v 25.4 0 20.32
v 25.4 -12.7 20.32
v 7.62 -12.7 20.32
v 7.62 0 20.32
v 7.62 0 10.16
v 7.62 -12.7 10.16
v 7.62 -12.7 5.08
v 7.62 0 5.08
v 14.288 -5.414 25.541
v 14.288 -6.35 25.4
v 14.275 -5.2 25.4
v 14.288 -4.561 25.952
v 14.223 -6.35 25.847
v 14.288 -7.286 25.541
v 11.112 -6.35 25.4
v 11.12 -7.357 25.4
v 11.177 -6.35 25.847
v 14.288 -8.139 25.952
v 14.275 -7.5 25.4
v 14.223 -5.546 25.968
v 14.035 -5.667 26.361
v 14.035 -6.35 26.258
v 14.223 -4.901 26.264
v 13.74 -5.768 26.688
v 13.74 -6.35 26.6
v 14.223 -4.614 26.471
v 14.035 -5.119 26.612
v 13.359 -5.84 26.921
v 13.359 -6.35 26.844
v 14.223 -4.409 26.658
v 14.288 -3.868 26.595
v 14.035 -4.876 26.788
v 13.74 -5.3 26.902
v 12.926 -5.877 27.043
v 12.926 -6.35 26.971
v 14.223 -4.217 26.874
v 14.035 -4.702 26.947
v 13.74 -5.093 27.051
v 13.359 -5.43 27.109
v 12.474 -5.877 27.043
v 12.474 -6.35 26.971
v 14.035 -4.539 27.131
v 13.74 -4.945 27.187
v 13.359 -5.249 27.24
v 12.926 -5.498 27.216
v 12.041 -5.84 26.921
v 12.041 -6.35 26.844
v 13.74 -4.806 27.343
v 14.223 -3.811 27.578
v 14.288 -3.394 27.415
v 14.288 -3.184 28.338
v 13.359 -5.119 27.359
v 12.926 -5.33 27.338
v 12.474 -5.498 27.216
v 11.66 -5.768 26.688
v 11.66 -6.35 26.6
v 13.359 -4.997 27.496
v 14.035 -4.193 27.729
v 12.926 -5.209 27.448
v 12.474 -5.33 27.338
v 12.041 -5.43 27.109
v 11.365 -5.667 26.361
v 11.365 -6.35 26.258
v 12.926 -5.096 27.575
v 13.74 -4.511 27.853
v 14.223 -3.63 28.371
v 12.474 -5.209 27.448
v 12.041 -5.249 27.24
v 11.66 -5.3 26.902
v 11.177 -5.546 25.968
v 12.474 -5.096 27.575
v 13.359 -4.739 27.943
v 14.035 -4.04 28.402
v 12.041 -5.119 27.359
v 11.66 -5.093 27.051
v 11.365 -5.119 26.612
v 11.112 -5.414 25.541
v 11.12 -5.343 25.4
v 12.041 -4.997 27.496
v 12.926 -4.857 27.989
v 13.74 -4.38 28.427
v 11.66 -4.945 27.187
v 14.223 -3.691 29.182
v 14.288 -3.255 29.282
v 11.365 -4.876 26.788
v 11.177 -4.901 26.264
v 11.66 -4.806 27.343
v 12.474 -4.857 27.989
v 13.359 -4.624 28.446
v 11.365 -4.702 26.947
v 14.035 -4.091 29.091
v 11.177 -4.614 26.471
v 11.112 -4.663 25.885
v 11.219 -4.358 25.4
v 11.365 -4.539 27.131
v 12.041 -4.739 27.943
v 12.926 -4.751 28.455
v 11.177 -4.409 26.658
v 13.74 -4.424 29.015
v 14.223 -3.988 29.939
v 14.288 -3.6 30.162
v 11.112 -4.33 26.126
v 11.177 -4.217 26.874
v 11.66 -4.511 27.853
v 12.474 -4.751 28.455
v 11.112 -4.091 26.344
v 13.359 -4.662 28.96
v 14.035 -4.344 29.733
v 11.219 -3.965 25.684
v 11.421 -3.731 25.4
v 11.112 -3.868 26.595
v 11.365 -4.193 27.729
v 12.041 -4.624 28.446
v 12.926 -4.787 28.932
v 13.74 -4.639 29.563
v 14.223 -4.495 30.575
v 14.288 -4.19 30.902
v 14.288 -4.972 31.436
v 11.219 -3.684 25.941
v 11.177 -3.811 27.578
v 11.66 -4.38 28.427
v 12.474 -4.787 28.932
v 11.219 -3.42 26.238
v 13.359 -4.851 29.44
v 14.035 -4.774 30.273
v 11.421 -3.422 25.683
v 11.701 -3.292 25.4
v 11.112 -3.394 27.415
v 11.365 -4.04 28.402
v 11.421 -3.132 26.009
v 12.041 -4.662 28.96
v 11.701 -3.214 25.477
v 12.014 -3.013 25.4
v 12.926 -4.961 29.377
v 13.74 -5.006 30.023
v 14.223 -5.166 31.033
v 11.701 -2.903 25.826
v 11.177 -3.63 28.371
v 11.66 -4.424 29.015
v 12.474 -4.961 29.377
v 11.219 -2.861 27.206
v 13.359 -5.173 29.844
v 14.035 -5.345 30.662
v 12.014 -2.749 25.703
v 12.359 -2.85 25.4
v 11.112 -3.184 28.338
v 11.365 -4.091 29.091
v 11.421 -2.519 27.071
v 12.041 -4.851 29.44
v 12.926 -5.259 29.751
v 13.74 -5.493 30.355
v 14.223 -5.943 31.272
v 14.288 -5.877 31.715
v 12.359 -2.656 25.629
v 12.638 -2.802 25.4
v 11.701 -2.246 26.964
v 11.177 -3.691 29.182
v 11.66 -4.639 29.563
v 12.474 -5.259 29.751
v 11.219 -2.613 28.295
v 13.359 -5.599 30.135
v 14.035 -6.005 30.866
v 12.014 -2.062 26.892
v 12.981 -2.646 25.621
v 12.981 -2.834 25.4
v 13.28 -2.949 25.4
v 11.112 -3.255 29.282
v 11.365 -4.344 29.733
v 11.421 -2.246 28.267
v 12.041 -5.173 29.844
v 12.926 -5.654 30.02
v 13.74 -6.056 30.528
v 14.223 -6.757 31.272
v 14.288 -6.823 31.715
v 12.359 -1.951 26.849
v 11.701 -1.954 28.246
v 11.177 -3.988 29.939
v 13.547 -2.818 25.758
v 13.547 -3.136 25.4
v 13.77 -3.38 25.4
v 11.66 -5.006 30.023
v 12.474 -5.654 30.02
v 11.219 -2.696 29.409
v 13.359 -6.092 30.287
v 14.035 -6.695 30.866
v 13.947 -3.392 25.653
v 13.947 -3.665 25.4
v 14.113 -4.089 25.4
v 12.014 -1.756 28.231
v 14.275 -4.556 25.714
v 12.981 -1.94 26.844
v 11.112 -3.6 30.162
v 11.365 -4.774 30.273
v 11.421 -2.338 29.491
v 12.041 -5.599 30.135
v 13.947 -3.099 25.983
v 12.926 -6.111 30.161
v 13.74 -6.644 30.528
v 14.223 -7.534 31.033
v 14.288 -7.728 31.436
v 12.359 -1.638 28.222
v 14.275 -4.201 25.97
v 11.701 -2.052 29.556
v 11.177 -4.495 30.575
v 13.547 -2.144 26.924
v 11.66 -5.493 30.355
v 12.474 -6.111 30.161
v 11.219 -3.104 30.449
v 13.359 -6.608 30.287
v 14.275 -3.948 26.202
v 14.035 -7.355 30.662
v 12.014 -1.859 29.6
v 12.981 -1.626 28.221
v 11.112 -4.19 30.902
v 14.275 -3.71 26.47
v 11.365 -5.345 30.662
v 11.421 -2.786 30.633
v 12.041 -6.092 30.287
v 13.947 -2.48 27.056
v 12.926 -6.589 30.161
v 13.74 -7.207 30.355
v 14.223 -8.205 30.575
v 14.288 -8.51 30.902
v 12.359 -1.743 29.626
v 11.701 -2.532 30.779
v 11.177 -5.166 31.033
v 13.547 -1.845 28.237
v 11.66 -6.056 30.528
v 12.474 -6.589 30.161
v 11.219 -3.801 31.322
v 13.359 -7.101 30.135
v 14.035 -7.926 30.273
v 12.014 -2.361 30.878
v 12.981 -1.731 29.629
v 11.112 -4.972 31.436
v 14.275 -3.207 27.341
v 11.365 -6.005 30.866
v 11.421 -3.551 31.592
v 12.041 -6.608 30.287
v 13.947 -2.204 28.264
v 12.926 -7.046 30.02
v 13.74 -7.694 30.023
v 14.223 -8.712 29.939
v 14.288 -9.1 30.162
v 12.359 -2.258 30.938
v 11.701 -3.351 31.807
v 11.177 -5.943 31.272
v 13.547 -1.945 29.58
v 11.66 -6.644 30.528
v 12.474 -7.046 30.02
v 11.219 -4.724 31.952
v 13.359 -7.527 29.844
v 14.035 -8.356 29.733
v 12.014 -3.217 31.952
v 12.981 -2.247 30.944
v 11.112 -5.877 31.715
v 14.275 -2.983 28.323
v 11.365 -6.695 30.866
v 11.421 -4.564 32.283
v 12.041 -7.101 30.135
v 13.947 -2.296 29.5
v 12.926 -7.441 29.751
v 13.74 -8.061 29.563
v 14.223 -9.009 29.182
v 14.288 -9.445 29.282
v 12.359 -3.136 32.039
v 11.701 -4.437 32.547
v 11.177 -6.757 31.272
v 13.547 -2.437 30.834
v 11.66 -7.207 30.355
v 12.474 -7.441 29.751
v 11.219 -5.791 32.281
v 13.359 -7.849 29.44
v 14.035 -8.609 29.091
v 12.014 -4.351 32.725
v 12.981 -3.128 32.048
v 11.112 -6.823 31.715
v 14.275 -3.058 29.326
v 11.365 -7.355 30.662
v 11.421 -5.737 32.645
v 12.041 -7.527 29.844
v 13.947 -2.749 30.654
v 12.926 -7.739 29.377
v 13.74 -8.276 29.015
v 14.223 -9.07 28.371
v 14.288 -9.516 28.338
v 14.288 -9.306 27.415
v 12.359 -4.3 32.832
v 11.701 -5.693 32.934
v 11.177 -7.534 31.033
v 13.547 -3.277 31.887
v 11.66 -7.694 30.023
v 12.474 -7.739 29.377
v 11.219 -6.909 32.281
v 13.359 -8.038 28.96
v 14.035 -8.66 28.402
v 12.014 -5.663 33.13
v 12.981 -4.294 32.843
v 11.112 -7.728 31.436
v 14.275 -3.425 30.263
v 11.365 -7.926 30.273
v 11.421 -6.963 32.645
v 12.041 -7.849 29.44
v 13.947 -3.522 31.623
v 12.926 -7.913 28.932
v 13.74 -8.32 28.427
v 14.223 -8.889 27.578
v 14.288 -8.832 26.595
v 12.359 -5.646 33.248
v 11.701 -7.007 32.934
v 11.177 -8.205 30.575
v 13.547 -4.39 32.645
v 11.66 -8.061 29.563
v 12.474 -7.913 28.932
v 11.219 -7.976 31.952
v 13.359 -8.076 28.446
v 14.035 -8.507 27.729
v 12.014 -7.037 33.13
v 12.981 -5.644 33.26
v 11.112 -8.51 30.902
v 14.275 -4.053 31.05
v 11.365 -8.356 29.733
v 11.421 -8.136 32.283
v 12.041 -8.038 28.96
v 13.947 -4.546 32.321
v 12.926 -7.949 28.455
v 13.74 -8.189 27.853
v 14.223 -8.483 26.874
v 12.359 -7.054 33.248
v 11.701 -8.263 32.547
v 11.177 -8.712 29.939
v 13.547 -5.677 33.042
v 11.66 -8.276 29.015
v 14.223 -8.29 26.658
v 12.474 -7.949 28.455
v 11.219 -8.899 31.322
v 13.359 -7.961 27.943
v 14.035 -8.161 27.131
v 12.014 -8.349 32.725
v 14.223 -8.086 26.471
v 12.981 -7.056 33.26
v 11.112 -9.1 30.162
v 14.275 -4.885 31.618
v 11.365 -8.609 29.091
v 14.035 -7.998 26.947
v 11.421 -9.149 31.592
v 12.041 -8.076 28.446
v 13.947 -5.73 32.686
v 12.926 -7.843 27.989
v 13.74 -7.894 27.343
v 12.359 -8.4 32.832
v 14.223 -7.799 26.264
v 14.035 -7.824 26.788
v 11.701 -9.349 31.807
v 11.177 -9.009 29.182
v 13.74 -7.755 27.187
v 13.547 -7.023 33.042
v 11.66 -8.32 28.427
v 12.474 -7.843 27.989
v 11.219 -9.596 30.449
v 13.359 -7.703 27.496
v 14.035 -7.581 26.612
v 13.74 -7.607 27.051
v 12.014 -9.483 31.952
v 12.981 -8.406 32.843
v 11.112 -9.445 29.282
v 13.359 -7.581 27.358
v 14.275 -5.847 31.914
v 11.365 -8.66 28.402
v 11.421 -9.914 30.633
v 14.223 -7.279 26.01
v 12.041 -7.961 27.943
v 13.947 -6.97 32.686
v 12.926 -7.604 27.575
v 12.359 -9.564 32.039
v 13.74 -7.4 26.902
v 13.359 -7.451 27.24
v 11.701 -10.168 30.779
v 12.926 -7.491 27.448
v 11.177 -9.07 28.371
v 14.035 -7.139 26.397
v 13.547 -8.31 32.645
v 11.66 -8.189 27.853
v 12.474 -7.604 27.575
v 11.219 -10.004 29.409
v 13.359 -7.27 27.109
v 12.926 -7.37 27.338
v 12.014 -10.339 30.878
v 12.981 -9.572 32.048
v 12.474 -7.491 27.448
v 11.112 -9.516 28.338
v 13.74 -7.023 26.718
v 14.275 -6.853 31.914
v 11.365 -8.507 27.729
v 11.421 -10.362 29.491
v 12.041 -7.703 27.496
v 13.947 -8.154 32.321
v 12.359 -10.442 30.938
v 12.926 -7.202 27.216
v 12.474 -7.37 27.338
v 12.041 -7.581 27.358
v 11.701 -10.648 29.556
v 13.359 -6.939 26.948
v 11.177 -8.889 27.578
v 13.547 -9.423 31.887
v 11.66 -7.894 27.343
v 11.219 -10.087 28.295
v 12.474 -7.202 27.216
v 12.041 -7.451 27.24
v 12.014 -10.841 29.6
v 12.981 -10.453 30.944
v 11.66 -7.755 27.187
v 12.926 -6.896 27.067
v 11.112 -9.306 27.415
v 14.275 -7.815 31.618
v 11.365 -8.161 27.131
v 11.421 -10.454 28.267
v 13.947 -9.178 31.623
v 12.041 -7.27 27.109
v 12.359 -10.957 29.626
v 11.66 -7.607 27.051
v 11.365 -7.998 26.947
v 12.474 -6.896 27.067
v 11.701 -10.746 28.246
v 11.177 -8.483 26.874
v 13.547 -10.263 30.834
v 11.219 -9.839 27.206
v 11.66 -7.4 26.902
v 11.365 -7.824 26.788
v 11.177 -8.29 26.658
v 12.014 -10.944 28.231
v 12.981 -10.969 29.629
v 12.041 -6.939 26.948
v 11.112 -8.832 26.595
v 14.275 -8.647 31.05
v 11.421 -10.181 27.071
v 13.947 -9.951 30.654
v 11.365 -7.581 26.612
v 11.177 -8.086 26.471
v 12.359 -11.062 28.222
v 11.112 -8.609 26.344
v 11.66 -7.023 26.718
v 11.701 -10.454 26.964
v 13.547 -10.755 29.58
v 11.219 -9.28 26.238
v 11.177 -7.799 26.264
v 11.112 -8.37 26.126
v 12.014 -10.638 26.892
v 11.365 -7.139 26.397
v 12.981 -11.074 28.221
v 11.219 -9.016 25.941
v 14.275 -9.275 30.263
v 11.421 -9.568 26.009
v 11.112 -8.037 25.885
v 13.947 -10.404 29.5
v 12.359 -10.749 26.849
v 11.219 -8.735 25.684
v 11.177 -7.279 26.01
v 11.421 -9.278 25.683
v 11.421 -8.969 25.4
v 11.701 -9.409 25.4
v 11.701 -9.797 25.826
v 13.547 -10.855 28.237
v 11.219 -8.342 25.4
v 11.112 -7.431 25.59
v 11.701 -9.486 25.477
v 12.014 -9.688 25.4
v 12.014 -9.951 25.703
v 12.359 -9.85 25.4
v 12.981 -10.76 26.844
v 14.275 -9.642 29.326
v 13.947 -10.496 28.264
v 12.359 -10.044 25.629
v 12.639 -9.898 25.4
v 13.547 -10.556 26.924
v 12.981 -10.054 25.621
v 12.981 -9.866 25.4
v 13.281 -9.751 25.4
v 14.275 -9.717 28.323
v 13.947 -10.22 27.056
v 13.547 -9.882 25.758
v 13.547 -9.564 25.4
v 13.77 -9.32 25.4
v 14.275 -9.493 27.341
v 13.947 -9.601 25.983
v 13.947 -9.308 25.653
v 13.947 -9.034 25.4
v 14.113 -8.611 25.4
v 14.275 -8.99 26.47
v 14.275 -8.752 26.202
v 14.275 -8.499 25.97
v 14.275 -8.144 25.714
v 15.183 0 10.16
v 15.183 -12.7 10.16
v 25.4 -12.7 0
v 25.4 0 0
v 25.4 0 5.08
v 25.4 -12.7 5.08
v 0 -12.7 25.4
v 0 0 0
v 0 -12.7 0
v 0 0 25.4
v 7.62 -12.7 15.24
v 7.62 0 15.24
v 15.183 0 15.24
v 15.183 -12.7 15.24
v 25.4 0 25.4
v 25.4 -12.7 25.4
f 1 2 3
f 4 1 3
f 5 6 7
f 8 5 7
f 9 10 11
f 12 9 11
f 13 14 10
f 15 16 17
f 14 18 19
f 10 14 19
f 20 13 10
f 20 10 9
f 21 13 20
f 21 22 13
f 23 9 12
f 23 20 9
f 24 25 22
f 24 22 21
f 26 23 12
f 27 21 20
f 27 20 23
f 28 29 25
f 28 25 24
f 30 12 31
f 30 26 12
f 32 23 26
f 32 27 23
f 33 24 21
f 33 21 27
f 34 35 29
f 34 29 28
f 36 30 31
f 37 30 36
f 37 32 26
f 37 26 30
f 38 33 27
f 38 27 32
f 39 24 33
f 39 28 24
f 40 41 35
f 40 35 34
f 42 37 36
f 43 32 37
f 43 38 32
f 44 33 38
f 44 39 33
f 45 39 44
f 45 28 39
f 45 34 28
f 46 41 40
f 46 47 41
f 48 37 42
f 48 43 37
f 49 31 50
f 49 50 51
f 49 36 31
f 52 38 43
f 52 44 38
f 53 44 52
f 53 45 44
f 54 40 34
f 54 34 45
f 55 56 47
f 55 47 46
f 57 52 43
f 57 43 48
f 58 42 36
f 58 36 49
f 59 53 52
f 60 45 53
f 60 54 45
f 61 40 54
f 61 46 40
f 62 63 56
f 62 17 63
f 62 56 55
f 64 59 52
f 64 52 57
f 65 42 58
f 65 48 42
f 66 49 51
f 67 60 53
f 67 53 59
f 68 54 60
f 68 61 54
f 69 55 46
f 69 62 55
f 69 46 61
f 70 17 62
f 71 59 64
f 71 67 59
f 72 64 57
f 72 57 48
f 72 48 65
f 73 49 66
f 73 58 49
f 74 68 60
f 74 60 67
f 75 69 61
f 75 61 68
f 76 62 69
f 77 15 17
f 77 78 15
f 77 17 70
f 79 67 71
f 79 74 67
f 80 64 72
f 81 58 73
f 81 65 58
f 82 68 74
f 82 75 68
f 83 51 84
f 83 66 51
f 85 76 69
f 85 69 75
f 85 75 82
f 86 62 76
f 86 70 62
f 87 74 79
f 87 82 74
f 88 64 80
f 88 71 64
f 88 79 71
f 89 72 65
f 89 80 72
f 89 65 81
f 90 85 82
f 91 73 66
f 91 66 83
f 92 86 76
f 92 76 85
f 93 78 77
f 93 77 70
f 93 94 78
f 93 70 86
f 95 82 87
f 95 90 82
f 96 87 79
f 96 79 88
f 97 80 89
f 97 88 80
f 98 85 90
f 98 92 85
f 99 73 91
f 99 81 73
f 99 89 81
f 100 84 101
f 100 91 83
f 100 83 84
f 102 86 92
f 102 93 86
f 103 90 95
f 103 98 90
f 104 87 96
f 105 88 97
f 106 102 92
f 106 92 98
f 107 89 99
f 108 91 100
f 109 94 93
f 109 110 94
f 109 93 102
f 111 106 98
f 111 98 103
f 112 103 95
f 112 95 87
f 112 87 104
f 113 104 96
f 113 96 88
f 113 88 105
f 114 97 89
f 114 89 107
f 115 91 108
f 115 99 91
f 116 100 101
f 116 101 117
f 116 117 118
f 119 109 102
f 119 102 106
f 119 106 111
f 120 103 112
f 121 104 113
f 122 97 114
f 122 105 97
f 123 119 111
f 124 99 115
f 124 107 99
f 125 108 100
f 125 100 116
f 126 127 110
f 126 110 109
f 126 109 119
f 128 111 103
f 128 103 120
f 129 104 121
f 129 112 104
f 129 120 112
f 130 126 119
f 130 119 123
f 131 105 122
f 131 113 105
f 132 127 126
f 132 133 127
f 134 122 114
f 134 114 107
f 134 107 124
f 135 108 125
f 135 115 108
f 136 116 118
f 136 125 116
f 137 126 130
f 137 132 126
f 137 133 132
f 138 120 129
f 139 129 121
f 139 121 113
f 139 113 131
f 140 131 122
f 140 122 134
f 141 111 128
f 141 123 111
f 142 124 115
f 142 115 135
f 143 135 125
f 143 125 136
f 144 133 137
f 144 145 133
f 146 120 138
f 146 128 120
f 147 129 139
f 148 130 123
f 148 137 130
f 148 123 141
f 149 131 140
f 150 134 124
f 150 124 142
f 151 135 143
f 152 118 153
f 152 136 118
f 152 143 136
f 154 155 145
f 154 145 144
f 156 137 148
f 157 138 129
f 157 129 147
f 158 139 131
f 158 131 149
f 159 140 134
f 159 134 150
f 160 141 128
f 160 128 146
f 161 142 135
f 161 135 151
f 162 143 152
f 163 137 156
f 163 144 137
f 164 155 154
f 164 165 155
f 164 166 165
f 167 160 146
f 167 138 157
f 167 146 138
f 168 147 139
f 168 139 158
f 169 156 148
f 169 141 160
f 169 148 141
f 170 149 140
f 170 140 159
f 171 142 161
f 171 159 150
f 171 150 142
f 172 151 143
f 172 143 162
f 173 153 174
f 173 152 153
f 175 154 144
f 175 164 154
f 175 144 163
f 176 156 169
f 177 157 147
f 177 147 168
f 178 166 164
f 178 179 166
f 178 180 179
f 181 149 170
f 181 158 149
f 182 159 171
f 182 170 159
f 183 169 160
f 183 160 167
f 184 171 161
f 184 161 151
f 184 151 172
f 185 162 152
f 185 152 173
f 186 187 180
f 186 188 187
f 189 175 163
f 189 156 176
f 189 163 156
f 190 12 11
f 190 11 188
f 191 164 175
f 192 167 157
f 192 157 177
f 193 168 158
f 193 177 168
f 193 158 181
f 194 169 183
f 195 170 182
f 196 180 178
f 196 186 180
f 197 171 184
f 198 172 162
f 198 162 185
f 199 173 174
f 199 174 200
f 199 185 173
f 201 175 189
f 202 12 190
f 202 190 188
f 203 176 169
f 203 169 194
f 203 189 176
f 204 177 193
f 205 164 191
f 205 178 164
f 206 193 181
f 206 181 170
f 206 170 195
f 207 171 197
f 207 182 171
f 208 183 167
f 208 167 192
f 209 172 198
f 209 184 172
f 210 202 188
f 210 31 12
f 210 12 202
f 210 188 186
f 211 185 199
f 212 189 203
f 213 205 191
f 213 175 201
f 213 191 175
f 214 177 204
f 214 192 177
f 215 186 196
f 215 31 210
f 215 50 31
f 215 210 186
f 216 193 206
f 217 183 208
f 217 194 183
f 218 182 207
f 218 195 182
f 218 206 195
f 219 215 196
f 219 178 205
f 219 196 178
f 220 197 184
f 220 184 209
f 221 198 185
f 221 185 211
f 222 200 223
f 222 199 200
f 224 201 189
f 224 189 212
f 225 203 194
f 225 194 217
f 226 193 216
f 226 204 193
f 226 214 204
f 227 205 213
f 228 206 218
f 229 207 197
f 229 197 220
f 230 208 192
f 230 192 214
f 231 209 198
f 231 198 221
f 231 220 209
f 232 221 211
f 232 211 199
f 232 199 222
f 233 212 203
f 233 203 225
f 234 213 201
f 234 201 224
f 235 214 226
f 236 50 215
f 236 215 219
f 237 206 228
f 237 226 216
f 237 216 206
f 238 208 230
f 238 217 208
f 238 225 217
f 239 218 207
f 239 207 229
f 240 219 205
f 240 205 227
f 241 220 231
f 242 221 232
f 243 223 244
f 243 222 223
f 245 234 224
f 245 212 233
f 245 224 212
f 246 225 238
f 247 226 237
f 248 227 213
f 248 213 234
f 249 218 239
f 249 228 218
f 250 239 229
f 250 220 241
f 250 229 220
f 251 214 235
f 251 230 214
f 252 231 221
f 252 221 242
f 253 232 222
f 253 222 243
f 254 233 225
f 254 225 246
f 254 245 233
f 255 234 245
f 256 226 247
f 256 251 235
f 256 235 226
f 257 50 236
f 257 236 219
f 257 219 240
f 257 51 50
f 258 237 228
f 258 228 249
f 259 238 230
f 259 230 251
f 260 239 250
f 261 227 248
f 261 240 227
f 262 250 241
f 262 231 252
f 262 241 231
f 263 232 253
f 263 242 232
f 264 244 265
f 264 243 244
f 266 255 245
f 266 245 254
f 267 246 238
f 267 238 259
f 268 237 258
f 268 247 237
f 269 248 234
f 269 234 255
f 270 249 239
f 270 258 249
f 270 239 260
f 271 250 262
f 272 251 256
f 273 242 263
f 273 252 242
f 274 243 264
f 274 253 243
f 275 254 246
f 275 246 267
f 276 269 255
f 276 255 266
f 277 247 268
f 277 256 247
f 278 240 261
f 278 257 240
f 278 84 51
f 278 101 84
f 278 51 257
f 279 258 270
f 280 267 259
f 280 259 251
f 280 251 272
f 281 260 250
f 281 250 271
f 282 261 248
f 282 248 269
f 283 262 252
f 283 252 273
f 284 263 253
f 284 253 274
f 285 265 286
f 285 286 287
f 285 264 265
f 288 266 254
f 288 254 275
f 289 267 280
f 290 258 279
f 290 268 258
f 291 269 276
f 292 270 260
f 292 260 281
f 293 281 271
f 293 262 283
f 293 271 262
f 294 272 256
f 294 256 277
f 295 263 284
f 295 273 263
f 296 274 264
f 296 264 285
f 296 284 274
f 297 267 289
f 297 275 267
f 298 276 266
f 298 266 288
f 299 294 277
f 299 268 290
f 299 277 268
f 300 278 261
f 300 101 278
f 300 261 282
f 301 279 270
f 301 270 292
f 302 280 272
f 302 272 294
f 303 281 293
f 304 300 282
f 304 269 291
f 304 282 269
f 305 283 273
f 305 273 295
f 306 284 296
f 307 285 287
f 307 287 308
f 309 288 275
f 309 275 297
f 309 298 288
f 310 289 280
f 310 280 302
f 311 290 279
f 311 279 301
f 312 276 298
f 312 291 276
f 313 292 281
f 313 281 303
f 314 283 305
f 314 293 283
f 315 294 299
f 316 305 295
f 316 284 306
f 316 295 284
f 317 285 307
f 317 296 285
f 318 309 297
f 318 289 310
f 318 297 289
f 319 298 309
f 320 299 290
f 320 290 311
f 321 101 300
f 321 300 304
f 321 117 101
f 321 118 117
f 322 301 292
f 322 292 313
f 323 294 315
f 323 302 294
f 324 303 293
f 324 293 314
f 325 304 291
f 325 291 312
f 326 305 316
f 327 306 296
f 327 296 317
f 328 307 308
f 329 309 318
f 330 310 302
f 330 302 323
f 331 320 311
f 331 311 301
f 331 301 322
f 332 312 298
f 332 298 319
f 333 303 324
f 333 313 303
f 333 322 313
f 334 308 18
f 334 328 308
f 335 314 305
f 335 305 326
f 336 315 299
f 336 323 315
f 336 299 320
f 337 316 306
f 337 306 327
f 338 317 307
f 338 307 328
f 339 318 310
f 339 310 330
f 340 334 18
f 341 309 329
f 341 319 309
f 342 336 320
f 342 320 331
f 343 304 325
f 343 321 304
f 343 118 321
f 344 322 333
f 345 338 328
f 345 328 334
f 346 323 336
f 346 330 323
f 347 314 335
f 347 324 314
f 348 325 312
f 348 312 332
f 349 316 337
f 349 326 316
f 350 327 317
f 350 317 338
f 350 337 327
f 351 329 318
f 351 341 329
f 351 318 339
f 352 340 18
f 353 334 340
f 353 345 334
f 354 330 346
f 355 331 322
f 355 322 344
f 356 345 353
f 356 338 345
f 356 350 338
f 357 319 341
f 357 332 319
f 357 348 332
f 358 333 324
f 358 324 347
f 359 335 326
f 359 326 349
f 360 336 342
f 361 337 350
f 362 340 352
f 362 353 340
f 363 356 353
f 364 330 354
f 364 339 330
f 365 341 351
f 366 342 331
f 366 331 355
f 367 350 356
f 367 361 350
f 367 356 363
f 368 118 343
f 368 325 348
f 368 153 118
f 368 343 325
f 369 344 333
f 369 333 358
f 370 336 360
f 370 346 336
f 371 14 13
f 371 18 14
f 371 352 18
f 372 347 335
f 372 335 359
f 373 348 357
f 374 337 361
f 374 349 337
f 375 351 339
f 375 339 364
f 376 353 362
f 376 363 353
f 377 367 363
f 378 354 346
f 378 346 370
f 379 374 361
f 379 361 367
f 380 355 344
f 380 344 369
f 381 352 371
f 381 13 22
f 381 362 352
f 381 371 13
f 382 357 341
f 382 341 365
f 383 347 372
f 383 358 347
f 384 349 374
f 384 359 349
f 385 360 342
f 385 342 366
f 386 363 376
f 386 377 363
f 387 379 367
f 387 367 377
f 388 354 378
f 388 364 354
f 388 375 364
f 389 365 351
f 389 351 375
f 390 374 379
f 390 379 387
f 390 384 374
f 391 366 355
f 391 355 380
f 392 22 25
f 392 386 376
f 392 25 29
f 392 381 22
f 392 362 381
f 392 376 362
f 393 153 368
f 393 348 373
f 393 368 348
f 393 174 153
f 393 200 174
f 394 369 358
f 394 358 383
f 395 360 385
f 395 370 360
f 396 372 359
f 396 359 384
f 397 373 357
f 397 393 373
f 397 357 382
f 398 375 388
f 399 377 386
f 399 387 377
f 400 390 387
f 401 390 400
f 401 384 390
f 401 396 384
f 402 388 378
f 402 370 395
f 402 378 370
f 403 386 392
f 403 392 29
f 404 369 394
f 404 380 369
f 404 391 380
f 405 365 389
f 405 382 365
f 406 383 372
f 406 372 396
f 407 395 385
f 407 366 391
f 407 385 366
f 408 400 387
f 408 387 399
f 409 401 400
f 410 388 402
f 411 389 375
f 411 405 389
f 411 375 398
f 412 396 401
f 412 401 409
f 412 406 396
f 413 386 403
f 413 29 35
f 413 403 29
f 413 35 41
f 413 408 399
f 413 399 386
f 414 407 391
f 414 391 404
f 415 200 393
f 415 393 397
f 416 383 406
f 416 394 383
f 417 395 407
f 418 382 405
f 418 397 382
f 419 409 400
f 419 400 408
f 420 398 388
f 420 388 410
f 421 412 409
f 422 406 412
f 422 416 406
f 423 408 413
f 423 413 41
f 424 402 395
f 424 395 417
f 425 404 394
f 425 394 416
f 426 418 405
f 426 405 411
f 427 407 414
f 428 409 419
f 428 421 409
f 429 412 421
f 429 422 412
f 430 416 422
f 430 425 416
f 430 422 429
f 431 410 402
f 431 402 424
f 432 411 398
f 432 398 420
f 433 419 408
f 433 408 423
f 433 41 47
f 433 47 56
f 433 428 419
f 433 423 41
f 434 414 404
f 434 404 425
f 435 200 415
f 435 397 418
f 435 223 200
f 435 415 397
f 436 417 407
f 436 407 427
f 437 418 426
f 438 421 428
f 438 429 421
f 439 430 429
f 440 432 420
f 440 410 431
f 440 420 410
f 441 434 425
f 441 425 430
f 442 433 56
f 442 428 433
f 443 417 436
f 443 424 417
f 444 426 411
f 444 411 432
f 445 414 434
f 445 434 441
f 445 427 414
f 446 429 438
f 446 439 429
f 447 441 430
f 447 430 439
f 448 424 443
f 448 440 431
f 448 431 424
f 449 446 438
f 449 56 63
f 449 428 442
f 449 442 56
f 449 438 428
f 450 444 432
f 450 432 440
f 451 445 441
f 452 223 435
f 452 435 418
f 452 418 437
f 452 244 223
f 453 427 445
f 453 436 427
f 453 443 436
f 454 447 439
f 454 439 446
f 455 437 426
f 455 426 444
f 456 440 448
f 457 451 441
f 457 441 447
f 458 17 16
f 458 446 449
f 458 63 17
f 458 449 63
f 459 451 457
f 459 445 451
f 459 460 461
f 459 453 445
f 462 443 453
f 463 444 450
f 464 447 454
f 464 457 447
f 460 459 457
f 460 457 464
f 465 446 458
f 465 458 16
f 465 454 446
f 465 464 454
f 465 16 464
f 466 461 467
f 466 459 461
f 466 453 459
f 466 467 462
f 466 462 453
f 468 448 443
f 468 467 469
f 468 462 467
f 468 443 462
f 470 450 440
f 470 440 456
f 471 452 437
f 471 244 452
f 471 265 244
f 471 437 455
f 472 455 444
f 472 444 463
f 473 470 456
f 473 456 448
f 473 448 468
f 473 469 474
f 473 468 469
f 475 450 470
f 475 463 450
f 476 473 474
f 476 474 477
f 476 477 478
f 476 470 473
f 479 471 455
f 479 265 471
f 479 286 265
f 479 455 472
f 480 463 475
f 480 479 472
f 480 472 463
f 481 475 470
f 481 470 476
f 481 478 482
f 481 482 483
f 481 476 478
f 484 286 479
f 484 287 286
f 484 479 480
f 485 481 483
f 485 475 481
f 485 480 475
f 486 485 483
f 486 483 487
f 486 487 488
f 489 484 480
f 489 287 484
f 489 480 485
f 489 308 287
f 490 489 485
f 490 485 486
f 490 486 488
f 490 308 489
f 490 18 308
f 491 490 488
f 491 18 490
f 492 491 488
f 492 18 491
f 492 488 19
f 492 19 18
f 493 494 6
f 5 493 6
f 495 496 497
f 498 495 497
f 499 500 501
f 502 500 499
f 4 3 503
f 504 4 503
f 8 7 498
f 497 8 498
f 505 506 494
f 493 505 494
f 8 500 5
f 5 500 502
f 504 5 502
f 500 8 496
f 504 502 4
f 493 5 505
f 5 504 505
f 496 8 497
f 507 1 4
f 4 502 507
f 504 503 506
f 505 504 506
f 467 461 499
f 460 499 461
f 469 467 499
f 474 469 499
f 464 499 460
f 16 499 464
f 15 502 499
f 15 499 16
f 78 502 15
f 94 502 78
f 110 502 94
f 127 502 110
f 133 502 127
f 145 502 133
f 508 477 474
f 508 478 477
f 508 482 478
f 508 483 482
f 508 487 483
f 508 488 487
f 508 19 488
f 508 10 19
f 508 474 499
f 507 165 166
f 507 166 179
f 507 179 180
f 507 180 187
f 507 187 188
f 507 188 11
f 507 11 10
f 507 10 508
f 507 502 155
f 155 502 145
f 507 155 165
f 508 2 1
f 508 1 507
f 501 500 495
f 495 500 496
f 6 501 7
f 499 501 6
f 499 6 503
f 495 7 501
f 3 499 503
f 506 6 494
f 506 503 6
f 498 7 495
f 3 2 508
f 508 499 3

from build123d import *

# Parameters (mm, degrees)
F0_W     = 25.4
F0_H     = 25.4
F1_DEPTH = 12.7
F3_DEPTH = 25.4
F5_R     = 1.5875


# Not quite as in the source:
# - a feature names something its author has since deleted; it is built from what else it names


with BuildPart() as f1:
    # F0 (on Front) → F1 (new body)
    with BuildSketch(Plane.XZ):
        with Locations((12.7, 12.7)):
            Rectangle(F0_W, F0_H)
    extrude(amount=F1_DEPTH)

    # F2 (on face) → F3 (cut)
    with BuildSketch(Plane.XZ.offset(12.7)):
        Polygon((25.4, 5.08), (25.4, 20.32), (7.62, 20.32), (7.62, 15.24), (15.1830166578, 15.24), (15.1830166578, 10.16), (7.62, 10.16), (7.62, 5.08), align=None)
    extrude(amount=-F3_DEPTH, mode=Mode.SUBTRACT)

    # F5 (on offset) → F6 (revolve)
    with BuildSketch(Plane.XZ.offset(6.35)):
        with Locations((12.7, 25.4)):
            Circle(F5_R)
    revolve(axis=Axis((14.955827035, -6.35, 28.575), (1, 0, 0)))


solid = f1.part
